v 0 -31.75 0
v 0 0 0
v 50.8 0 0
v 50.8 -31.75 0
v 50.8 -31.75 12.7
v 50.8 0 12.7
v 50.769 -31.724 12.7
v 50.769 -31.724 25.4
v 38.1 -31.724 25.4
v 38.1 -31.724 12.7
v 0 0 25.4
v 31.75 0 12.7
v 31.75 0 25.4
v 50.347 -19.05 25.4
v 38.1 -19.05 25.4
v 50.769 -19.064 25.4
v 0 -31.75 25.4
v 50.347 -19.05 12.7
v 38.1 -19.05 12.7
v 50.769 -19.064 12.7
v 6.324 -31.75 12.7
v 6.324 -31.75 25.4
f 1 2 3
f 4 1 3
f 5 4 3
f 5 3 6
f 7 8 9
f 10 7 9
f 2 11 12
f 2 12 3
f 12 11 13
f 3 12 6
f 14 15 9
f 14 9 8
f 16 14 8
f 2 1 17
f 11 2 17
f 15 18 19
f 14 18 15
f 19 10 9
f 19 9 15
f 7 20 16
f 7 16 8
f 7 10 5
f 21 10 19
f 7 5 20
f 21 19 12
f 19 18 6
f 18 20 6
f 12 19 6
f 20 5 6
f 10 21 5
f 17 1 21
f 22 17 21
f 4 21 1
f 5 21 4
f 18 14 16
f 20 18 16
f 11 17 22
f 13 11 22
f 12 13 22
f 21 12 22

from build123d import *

# Parameters (mm, degrees)
F0_W     = 50.8
F0_H     = 25.4
F1_DEPTH = 31.75
F2_W     = 19.05
F2_H     = 12.7
F3_DEPTH = 19.05
F6_DEPTH = 12.7


with BuildPart() as f1:
    # F0 (on Front) → F1 (new body)
    with BuildSketch(Plane.XZ):
        with Locations((25.4, 12.7)):
            Rectangle(F0_W, F0_H)
    extrude(amount=F1_DEPTH)

    # F2 (on face) → F3 (cut)
    with BuildSketch(Plane.YZ.offset(50.8)):
        with Locations((-9.525, 19.05)):
            Rectangle(F2_W, F2_H)
    extrude(amount=-F3_DEPTH, mode=Mode.SUBTRACT)

    # F5 (on face) → F6 (cut)
    with BuildSketch(Plane.XY.offset(25.4)):
        Polygon((50.768599, -31.724313), (38.1, -31.724313), (38.1, -19.05), (31.75, -19.05), (31.75, 0), (6.32382, -31.75), (50.8, -31.75), (50.8, -19.05), (50.347392, -19.05), (50.768599, -19.064216), align=None)
    extrude(amount=-F6_DEPTH, mode=Mode.SUBTRACT)


solid = f1.part
